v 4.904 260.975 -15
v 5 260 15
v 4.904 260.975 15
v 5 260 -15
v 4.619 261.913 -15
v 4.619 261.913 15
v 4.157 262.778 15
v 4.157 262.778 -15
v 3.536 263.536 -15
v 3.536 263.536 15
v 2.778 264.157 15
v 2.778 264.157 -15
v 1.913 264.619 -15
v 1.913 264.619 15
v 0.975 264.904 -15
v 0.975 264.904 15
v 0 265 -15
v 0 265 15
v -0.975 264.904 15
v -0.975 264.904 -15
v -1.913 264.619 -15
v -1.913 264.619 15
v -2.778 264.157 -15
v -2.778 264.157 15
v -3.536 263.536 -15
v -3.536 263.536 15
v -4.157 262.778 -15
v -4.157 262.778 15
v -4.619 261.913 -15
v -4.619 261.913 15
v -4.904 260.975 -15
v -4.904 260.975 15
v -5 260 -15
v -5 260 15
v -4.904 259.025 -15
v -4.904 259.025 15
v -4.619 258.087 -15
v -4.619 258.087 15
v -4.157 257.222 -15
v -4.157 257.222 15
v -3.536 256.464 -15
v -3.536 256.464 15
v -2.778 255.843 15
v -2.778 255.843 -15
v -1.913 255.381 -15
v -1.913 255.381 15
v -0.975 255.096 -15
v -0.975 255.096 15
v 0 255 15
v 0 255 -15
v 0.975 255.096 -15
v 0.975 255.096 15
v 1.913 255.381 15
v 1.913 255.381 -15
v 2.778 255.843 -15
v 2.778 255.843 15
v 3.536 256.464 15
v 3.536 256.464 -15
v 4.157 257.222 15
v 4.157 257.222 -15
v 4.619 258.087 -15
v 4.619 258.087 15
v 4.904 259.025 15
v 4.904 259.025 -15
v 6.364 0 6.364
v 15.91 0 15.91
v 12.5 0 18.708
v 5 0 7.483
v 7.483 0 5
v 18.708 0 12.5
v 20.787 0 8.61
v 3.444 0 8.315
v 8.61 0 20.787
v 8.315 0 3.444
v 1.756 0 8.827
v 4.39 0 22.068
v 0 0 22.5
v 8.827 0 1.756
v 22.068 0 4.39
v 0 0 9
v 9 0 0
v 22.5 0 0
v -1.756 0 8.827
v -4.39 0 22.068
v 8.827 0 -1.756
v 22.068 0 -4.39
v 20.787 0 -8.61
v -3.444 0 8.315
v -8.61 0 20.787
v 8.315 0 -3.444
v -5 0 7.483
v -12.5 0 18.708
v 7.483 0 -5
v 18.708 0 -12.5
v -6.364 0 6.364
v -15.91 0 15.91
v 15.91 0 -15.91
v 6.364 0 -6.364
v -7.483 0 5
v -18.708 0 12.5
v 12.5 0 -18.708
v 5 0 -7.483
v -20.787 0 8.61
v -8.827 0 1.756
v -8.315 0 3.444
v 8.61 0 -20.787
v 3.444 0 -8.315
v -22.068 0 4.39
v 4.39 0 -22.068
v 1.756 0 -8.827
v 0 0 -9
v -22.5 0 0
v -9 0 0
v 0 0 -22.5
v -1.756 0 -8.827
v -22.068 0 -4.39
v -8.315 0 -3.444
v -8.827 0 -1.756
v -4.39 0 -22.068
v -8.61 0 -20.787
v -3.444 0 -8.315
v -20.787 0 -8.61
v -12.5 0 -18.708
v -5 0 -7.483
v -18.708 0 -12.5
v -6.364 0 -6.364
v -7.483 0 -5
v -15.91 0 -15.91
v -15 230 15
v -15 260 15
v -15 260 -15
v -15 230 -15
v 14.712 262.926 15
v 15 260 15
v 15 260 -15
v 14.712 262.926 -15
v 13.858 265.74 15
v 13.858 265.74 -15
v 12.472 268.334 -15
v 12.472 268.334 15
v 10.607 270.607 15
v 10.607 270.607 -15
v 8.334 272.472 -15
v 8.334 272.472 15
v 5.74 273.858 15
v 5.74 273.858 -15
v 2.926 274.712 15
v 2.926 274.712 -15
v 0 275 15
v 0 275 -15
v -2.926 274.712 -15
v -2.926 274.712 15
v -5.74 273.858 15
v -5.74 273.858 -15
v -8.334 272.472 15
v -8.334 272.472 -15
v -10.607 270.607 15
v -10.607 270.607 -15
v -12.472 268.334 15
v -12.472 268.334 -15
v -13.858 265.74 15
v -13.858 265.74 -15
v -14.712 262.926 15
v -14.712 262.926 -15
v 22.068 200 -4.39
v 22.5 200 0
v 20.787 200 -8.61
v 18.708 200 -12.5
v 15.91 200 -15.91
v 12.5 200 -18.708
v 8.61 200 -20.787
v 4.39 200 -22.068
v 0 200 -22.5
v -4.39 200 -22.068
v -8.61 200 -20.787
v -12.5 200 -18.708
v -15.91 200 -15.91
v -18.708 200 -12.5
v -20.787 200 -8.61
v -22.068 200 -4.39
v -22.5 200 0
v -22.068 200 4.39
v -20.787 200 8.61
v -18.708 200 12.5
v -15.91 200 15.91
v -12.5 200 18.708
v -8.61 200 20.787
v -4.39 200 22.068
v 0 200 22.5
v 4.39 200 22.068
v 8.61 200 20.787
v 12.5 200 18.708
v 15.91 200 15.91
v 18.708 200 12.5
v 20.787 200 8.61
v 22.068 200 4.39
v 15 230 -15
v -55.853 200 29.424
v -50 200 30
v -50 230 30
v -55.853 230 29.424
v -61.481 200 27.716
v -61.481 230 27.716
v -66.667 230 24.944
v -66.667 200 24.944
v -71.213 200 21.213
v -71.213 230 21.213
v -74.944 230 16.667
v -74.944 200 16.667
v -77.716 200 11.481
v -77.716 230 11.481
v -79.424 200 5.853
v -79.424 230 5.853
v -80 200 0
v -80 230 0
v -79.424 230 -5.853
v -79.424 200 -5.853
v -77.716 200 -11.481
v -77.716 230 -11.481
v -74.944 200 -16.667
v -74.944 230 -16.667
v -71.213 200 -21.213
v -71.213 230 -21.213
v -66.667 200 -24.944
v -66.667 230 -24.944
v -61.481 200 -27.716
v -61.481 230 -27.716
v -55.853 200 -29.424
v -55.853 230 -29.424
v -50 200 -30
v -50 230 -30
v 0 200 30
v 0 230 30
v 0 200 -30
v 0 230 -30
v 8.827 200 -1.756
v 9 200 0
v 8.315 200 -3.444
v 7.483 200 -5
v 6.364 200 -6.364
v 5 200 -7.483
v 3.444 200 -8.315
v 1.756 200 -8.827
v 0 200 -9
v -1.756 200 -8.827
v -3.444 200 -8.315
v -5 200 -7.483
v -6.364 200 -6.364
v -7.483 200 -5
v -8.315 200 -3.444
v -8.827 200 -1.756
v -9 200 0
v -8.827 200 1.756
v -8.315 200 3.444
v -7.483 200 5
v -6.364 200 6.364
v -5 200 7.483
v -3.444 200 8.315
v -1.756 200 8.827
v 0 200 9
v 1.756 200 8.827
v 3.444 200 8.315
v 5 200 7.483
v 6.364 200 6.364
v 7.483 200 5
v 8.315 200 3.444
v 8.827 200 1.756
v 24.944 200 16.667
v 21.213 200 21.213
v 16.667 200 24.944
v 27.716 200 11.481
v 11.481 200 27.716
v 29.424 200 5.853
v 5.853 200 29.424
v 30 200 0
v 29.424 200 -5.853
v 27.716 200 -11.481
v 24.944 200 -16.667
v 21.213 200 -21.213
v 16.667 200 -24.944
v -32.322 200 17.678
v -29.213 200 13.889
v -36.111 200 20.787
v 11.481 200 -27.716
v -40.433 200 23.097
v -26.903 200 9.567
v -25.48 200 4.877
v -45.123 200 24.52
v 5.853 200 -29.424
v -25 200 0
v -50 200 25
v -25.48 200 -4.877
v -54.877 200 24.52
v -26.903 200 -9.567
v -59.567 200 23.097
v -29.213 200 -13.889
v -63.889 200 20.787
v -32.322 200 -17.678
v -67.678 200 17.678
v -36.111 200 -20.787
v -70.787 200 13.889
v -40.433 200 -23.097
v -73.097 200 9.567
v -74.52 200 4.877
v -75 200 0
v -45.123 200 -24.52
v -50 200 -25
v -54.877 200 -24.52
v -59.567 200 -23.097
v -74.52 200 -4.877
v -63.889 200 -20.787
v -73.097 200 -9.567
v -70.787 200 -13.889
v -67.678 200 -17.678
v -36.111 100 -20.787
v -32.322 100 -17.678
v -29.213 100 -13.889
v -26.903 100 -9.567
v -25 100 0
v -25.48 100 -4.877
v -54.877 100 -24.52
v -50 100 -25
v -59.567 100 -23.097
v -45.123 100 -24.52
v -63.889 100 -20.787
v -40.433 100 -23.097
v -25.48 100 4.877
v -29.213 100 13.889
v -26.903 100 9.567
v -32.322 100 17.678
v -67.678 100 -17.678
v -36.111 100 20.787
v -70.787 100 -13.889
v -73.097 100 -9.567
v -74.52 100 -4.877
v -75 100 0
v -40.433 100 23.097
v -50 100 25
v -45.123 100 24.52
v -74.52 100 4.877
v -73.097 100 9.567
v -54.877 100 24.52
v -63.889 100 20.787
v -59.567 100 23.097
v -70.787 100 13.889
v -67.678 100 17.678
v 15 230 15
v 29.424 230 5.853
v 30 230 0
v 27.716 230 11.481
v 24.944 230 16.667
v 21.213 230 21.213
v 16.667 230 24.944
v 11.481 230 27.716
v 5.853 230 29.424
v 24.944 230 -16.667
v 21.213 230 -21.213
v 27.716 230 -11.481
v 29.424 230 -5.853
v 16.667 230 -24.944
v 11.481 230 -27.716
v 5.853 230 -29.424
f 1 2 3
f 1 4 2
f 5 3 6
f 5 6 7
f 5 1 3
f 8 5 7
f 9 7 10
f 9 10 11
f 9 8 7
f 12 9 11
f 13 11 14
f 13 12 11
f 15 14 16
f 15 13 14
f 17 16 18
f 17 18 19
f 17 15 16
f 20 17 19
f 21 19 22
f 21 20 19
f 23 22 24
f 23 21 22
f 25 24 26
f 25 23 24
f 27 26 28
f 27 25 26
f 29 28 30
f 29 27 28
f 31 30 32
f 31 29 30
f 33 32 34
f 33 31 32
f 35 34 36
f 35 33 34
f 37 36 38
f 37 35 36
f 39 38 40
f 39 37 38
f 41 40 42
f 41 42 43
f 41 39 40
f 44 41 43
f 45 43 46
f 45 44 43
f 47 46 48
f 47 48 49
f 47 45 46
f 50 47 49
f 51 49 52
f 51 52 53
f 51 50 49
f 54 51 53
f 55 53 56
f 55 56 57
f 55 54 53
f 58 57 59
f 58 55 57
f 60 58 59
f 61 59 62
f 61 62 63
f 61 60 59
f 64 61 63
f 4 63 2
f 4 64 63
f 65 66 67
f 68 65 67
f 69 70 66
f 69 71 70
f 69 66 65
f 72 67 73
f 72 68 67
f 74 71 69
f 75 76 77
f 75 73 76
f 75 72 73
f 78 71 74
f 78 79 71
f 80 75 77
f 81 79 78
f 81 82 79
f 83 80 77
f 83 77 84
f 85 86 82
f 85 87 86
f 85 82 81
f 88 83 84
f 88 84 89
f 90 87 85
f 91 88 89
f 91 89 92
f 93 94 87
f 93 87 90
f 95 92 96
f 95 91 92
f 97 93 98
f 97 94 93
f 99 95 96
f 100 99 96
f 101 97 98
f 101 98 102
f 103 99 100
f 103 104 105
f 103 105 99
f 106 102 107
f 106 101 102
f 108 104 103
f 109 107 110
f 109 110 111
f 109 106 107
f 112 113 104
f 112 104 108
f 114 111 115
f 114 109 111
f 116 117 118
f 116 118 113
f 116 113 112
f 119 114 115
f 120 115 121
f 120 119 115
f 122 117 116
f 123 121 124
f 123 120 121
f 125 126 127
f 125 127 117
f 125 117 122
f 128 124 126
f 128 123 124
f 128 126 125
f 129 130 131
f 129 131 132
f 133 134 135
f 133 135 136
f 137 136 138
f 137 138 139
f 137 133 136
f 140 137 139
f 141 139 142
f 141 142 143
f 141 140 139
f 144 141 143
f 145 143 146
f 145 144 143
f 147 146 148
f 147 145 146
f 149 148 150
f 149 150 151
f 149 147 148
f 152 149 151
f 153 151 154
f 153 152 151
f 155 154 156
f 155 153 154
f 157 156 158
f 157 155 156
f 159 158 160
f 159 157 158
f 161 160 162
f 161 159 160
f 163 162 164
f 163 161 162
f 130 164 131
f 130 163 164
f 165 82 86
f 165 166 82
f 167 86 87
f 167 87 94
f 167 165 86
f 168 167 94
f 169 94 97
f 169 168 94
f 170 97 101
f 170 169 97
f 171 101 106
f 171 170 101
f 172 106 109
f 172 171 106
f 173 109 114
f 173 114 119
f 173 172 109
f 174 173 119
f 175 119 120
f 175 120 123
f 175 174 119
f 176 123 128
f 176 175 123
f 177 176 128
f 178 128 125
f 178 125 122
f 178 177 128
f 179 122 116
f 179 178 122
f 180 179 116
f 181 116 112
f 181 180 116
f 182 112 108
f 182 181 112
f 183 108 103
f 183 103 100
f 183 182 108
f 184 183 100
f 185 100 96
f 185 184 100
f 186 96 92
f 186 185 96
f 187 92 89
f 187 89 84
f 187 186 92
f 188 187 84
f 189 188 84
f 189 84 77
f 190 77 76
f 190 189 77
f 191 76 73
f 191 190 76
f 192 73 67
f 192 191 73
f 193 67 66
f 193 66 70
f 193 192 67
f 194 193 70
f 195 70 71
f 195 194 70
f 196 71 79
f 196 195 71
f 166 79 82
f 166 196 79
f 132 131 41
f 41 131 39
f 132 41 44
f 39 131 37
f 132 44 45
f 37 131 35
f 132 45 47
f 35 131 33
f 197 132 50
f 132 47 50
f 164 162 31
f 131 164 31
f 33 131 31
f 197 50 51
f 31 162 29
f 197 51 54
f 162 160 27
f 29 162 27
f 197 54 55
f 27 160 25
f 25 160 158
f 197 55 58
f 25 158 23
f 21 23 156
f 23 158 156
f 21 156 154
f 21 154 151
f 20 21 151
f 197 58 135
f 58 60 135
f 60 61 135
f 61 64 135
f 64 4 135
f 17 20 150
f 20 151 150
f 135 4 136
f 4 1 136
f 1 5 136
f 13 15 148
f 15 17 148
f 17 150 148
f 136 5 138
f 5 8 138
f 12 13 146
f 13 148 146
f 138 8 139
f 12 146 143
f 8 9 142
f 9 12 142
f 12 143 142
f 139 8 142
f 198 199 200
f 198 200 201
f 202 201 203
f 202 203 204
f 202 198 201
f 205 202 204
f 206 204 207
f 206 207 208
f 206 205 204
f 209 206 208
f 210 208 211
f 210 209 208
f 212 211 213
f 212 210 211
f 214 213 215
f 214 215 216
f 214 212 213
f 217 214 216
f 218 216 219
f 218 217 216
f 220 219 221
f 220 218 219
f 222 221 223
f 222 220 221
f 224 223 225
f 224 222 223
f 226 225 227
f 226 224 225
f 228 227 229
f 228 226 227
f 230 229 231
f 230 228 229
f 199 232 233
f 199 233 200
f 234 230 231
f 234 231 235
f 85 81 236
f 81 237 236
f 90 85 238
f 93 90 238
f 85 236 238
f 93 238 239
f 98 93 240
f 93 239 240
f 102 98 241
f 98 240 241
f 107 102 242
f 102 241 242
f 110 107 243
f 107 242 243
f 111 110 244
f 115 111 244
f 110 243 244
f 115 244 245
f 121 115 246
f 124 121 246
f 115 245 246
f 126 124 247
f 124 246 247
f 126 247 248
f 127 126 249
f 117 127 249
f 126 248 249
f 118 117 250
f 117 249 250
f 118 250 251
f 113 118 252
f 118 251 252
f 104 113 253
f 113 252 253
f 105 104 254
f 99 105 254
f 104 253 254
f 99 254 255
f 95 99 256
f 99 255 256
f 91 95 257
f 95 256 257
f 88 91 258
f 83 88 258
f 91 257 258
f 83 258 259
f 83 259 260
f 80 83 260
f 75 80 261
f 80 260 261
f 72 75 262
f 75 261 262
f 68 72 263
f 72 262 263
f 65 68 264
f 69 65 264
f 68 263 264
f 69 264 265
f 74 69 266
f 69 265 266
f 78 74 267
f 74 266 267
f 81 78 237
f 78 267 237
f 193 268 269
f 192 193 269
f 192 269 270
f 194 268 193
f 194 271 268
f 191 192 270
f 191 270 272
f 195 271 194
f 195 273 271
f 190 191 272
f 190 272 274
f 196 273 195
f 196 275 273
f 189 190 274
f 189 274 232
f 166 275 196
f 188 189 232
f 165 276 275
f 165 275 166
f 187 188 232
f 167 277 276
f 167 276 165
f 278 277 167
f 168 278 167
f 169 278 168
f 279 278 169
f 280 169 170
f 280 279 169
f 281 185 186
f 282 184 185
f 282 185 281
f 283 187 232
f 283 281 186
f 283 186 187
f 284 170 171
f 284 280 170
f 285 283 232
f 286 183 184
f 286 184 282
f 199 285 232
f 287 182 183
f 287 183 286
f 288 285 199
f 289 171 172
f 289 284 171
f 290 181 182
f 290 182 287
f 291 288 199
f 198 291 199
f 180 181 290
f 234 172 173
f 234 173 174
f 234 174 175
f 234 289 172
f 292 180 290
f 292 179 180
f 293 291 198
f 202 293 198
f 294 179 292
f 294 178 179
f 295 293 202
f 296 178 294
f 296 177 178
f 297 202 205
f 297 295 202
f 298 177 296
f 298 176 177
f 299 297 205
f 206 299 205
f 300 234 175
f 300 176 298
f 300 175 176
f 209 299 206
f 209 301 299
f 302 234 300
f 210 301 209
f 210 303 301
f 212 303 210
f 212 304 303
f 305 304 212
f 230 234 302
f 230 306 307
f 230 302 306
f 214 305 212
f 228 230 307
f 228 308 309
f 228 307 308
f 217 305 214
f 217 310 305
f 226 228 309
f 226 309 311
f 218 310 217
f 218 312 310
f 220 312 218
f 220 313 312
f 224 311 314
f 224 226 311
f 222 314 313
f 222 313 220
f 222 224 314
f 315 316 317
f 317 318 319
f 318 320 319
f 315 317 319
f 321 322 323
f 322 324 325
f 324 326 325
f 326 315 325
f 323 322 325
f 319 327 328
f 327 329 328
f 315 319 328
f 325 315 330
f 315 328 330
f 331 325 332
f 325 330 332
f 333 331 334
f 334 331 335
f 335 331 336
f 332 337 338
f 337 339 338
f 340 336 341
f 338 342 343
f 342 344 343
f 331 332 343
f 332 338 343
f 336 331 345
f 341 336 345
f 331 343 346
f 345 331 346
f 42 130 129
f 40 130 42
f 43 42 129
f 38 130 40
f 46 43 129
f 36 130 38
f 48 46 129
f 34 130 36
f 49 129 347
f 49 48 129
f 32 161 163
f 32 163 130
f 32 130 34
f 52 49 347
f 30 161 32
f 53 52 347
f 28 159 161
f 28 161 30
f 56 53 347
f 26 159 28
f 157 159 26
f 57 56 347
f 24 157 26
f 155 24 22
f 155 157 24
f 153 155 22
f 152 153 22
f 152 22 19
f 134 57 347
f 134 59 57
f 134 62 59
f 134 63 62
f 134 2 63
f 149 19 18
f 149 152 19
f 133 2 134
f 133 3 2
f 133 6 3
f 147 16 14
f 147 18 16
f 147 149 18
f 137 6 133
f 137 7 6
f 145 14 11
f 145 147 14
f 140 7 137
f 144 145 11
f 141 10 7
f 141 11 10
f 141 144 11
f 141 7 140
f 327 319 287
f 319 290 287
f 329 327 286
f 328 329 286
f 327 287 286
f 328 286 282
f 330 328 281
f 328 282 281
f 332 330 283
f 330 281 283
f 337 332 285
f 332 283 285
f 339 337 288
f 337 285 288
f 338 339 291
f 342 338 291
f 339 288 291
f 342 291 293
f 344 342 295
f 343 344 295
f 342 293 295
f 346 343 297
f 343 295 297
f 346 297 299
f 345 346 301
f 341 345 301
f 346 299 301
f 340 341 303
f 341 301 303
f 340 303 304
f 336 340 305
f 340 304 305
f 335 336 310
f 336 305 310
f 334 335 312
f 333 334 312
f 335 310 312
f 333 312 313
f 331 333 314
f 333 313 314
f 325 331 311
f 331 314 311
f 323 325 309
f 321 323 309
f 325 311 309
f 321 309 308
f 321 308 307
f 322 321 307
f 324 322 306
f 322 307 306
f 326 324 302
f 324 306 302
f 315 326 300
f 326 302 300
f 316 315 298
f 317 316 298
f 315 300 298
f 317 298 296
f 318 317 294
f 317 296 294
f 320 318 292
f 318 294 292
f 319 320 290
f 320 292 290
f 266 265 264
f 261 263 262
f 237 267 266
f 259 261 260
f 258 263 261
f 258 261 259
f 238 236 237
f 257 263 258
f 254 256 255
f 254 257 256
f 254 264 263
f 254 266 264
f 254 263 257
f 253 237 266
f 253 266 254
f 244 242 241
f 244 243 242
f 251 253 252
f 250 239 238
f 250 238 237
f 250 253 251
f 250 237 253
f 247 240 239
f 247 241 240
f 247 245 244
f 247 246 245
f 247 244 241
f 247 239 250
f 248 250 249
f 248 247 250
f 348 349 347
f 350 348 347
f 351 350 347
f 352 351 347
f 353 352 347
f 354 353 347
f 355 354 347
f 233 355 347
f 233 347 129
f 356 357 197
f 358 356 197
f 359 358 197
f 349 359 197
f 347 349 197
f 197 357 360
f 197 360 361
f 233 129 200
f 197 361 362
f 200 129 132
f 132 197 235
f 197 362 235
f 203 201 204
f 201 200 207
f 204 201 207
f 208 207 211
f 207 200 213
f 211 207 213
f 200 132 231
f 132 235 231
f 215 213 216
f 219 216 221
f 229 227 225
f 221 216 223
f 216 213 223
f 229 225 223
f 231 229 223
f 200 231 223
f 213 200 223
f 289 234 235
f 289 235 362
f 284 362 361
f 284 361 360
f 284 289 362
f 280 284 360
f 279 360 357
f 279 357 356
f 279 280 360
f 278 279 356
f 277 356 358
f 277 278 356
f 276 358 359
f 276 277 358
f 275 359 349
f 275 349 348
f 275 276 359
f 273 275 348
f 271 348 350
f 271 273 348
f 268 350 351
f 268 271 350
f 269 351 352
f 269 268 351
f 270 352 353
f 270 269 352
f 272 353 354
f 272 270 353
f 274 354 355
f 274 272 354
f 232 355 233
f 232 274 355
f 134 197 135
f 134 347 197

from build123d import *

# Parameters (mm, degrees)
ESBO_O1_W                = 13.5
ESBO_O1_H                = 200
RESSALTO_EXTRUS_O1_DEPTH = 30
ESBO_O3_W                = 25
ESBO_O3_H                = 100
ESBO_O4_R                = 5
RESSALTO_EXTRUS_O2_DEPTH = 15


with BuildPart() as part:
    # Esboço1 → Revolução1 (revolve)
    with BuildSketch(Plane.XY):
        with Locations((15.75, 100)):
            Rectangle(ESBO_O1_W, ESBO_O1_H)
    revolve(axis=Axis((0, 0, 0), (0, 1, 0)))

    # Esboço2 → Ressalto-extrusão1 (add)
    with BuildSketch(Plane(origin=(0, 200, 0), x_dir=(1, 0, 0), z_dir=(0, 1, 0))):
        with BuildLine():
            Line((0, -30), (-50, -30))
            ThreePointArc((-50, -30), (-80, 0), (-50, 30))
            Line((-50, 30), (0, 30))
            ThreePointArc((0, 30), (30, 0), (0, -30))
        make_face()
    extrude(amount=RESSALTO_EXTRUS_O1_DEPTH)

    # Esboço3 → Revolução2 (revolve)
    with BuildSketch(Plane.XY):
        with Locations((-37.5, 150)):
            Rectangle(ESBO_O3_W, ESBO_O3_H)
    revolve(axis=Axis((-50, 200, 0), (0, -1, 0)))

    # Esboço4 → Ressalto-extrusão2 (add, symmetric)
    with BuildSketch(Plane.XY):
        with BuildLine():
            Line((15, 230), (15, 260))
            ThreePointArc((15, 260), (0, 275), (-15, 260))
            Line((-15, 260), (-15, 230))
            Line((-15, 230), (15, 230))
        make_face()
        with Locations((0, 260)):
            Circle(ESBO_O4_R, mode=Mode.SUBTRACT)
    extrude(amount=RESSALTO_EXTRUS_O2_DEPTH, both=True)


solid = part.part
